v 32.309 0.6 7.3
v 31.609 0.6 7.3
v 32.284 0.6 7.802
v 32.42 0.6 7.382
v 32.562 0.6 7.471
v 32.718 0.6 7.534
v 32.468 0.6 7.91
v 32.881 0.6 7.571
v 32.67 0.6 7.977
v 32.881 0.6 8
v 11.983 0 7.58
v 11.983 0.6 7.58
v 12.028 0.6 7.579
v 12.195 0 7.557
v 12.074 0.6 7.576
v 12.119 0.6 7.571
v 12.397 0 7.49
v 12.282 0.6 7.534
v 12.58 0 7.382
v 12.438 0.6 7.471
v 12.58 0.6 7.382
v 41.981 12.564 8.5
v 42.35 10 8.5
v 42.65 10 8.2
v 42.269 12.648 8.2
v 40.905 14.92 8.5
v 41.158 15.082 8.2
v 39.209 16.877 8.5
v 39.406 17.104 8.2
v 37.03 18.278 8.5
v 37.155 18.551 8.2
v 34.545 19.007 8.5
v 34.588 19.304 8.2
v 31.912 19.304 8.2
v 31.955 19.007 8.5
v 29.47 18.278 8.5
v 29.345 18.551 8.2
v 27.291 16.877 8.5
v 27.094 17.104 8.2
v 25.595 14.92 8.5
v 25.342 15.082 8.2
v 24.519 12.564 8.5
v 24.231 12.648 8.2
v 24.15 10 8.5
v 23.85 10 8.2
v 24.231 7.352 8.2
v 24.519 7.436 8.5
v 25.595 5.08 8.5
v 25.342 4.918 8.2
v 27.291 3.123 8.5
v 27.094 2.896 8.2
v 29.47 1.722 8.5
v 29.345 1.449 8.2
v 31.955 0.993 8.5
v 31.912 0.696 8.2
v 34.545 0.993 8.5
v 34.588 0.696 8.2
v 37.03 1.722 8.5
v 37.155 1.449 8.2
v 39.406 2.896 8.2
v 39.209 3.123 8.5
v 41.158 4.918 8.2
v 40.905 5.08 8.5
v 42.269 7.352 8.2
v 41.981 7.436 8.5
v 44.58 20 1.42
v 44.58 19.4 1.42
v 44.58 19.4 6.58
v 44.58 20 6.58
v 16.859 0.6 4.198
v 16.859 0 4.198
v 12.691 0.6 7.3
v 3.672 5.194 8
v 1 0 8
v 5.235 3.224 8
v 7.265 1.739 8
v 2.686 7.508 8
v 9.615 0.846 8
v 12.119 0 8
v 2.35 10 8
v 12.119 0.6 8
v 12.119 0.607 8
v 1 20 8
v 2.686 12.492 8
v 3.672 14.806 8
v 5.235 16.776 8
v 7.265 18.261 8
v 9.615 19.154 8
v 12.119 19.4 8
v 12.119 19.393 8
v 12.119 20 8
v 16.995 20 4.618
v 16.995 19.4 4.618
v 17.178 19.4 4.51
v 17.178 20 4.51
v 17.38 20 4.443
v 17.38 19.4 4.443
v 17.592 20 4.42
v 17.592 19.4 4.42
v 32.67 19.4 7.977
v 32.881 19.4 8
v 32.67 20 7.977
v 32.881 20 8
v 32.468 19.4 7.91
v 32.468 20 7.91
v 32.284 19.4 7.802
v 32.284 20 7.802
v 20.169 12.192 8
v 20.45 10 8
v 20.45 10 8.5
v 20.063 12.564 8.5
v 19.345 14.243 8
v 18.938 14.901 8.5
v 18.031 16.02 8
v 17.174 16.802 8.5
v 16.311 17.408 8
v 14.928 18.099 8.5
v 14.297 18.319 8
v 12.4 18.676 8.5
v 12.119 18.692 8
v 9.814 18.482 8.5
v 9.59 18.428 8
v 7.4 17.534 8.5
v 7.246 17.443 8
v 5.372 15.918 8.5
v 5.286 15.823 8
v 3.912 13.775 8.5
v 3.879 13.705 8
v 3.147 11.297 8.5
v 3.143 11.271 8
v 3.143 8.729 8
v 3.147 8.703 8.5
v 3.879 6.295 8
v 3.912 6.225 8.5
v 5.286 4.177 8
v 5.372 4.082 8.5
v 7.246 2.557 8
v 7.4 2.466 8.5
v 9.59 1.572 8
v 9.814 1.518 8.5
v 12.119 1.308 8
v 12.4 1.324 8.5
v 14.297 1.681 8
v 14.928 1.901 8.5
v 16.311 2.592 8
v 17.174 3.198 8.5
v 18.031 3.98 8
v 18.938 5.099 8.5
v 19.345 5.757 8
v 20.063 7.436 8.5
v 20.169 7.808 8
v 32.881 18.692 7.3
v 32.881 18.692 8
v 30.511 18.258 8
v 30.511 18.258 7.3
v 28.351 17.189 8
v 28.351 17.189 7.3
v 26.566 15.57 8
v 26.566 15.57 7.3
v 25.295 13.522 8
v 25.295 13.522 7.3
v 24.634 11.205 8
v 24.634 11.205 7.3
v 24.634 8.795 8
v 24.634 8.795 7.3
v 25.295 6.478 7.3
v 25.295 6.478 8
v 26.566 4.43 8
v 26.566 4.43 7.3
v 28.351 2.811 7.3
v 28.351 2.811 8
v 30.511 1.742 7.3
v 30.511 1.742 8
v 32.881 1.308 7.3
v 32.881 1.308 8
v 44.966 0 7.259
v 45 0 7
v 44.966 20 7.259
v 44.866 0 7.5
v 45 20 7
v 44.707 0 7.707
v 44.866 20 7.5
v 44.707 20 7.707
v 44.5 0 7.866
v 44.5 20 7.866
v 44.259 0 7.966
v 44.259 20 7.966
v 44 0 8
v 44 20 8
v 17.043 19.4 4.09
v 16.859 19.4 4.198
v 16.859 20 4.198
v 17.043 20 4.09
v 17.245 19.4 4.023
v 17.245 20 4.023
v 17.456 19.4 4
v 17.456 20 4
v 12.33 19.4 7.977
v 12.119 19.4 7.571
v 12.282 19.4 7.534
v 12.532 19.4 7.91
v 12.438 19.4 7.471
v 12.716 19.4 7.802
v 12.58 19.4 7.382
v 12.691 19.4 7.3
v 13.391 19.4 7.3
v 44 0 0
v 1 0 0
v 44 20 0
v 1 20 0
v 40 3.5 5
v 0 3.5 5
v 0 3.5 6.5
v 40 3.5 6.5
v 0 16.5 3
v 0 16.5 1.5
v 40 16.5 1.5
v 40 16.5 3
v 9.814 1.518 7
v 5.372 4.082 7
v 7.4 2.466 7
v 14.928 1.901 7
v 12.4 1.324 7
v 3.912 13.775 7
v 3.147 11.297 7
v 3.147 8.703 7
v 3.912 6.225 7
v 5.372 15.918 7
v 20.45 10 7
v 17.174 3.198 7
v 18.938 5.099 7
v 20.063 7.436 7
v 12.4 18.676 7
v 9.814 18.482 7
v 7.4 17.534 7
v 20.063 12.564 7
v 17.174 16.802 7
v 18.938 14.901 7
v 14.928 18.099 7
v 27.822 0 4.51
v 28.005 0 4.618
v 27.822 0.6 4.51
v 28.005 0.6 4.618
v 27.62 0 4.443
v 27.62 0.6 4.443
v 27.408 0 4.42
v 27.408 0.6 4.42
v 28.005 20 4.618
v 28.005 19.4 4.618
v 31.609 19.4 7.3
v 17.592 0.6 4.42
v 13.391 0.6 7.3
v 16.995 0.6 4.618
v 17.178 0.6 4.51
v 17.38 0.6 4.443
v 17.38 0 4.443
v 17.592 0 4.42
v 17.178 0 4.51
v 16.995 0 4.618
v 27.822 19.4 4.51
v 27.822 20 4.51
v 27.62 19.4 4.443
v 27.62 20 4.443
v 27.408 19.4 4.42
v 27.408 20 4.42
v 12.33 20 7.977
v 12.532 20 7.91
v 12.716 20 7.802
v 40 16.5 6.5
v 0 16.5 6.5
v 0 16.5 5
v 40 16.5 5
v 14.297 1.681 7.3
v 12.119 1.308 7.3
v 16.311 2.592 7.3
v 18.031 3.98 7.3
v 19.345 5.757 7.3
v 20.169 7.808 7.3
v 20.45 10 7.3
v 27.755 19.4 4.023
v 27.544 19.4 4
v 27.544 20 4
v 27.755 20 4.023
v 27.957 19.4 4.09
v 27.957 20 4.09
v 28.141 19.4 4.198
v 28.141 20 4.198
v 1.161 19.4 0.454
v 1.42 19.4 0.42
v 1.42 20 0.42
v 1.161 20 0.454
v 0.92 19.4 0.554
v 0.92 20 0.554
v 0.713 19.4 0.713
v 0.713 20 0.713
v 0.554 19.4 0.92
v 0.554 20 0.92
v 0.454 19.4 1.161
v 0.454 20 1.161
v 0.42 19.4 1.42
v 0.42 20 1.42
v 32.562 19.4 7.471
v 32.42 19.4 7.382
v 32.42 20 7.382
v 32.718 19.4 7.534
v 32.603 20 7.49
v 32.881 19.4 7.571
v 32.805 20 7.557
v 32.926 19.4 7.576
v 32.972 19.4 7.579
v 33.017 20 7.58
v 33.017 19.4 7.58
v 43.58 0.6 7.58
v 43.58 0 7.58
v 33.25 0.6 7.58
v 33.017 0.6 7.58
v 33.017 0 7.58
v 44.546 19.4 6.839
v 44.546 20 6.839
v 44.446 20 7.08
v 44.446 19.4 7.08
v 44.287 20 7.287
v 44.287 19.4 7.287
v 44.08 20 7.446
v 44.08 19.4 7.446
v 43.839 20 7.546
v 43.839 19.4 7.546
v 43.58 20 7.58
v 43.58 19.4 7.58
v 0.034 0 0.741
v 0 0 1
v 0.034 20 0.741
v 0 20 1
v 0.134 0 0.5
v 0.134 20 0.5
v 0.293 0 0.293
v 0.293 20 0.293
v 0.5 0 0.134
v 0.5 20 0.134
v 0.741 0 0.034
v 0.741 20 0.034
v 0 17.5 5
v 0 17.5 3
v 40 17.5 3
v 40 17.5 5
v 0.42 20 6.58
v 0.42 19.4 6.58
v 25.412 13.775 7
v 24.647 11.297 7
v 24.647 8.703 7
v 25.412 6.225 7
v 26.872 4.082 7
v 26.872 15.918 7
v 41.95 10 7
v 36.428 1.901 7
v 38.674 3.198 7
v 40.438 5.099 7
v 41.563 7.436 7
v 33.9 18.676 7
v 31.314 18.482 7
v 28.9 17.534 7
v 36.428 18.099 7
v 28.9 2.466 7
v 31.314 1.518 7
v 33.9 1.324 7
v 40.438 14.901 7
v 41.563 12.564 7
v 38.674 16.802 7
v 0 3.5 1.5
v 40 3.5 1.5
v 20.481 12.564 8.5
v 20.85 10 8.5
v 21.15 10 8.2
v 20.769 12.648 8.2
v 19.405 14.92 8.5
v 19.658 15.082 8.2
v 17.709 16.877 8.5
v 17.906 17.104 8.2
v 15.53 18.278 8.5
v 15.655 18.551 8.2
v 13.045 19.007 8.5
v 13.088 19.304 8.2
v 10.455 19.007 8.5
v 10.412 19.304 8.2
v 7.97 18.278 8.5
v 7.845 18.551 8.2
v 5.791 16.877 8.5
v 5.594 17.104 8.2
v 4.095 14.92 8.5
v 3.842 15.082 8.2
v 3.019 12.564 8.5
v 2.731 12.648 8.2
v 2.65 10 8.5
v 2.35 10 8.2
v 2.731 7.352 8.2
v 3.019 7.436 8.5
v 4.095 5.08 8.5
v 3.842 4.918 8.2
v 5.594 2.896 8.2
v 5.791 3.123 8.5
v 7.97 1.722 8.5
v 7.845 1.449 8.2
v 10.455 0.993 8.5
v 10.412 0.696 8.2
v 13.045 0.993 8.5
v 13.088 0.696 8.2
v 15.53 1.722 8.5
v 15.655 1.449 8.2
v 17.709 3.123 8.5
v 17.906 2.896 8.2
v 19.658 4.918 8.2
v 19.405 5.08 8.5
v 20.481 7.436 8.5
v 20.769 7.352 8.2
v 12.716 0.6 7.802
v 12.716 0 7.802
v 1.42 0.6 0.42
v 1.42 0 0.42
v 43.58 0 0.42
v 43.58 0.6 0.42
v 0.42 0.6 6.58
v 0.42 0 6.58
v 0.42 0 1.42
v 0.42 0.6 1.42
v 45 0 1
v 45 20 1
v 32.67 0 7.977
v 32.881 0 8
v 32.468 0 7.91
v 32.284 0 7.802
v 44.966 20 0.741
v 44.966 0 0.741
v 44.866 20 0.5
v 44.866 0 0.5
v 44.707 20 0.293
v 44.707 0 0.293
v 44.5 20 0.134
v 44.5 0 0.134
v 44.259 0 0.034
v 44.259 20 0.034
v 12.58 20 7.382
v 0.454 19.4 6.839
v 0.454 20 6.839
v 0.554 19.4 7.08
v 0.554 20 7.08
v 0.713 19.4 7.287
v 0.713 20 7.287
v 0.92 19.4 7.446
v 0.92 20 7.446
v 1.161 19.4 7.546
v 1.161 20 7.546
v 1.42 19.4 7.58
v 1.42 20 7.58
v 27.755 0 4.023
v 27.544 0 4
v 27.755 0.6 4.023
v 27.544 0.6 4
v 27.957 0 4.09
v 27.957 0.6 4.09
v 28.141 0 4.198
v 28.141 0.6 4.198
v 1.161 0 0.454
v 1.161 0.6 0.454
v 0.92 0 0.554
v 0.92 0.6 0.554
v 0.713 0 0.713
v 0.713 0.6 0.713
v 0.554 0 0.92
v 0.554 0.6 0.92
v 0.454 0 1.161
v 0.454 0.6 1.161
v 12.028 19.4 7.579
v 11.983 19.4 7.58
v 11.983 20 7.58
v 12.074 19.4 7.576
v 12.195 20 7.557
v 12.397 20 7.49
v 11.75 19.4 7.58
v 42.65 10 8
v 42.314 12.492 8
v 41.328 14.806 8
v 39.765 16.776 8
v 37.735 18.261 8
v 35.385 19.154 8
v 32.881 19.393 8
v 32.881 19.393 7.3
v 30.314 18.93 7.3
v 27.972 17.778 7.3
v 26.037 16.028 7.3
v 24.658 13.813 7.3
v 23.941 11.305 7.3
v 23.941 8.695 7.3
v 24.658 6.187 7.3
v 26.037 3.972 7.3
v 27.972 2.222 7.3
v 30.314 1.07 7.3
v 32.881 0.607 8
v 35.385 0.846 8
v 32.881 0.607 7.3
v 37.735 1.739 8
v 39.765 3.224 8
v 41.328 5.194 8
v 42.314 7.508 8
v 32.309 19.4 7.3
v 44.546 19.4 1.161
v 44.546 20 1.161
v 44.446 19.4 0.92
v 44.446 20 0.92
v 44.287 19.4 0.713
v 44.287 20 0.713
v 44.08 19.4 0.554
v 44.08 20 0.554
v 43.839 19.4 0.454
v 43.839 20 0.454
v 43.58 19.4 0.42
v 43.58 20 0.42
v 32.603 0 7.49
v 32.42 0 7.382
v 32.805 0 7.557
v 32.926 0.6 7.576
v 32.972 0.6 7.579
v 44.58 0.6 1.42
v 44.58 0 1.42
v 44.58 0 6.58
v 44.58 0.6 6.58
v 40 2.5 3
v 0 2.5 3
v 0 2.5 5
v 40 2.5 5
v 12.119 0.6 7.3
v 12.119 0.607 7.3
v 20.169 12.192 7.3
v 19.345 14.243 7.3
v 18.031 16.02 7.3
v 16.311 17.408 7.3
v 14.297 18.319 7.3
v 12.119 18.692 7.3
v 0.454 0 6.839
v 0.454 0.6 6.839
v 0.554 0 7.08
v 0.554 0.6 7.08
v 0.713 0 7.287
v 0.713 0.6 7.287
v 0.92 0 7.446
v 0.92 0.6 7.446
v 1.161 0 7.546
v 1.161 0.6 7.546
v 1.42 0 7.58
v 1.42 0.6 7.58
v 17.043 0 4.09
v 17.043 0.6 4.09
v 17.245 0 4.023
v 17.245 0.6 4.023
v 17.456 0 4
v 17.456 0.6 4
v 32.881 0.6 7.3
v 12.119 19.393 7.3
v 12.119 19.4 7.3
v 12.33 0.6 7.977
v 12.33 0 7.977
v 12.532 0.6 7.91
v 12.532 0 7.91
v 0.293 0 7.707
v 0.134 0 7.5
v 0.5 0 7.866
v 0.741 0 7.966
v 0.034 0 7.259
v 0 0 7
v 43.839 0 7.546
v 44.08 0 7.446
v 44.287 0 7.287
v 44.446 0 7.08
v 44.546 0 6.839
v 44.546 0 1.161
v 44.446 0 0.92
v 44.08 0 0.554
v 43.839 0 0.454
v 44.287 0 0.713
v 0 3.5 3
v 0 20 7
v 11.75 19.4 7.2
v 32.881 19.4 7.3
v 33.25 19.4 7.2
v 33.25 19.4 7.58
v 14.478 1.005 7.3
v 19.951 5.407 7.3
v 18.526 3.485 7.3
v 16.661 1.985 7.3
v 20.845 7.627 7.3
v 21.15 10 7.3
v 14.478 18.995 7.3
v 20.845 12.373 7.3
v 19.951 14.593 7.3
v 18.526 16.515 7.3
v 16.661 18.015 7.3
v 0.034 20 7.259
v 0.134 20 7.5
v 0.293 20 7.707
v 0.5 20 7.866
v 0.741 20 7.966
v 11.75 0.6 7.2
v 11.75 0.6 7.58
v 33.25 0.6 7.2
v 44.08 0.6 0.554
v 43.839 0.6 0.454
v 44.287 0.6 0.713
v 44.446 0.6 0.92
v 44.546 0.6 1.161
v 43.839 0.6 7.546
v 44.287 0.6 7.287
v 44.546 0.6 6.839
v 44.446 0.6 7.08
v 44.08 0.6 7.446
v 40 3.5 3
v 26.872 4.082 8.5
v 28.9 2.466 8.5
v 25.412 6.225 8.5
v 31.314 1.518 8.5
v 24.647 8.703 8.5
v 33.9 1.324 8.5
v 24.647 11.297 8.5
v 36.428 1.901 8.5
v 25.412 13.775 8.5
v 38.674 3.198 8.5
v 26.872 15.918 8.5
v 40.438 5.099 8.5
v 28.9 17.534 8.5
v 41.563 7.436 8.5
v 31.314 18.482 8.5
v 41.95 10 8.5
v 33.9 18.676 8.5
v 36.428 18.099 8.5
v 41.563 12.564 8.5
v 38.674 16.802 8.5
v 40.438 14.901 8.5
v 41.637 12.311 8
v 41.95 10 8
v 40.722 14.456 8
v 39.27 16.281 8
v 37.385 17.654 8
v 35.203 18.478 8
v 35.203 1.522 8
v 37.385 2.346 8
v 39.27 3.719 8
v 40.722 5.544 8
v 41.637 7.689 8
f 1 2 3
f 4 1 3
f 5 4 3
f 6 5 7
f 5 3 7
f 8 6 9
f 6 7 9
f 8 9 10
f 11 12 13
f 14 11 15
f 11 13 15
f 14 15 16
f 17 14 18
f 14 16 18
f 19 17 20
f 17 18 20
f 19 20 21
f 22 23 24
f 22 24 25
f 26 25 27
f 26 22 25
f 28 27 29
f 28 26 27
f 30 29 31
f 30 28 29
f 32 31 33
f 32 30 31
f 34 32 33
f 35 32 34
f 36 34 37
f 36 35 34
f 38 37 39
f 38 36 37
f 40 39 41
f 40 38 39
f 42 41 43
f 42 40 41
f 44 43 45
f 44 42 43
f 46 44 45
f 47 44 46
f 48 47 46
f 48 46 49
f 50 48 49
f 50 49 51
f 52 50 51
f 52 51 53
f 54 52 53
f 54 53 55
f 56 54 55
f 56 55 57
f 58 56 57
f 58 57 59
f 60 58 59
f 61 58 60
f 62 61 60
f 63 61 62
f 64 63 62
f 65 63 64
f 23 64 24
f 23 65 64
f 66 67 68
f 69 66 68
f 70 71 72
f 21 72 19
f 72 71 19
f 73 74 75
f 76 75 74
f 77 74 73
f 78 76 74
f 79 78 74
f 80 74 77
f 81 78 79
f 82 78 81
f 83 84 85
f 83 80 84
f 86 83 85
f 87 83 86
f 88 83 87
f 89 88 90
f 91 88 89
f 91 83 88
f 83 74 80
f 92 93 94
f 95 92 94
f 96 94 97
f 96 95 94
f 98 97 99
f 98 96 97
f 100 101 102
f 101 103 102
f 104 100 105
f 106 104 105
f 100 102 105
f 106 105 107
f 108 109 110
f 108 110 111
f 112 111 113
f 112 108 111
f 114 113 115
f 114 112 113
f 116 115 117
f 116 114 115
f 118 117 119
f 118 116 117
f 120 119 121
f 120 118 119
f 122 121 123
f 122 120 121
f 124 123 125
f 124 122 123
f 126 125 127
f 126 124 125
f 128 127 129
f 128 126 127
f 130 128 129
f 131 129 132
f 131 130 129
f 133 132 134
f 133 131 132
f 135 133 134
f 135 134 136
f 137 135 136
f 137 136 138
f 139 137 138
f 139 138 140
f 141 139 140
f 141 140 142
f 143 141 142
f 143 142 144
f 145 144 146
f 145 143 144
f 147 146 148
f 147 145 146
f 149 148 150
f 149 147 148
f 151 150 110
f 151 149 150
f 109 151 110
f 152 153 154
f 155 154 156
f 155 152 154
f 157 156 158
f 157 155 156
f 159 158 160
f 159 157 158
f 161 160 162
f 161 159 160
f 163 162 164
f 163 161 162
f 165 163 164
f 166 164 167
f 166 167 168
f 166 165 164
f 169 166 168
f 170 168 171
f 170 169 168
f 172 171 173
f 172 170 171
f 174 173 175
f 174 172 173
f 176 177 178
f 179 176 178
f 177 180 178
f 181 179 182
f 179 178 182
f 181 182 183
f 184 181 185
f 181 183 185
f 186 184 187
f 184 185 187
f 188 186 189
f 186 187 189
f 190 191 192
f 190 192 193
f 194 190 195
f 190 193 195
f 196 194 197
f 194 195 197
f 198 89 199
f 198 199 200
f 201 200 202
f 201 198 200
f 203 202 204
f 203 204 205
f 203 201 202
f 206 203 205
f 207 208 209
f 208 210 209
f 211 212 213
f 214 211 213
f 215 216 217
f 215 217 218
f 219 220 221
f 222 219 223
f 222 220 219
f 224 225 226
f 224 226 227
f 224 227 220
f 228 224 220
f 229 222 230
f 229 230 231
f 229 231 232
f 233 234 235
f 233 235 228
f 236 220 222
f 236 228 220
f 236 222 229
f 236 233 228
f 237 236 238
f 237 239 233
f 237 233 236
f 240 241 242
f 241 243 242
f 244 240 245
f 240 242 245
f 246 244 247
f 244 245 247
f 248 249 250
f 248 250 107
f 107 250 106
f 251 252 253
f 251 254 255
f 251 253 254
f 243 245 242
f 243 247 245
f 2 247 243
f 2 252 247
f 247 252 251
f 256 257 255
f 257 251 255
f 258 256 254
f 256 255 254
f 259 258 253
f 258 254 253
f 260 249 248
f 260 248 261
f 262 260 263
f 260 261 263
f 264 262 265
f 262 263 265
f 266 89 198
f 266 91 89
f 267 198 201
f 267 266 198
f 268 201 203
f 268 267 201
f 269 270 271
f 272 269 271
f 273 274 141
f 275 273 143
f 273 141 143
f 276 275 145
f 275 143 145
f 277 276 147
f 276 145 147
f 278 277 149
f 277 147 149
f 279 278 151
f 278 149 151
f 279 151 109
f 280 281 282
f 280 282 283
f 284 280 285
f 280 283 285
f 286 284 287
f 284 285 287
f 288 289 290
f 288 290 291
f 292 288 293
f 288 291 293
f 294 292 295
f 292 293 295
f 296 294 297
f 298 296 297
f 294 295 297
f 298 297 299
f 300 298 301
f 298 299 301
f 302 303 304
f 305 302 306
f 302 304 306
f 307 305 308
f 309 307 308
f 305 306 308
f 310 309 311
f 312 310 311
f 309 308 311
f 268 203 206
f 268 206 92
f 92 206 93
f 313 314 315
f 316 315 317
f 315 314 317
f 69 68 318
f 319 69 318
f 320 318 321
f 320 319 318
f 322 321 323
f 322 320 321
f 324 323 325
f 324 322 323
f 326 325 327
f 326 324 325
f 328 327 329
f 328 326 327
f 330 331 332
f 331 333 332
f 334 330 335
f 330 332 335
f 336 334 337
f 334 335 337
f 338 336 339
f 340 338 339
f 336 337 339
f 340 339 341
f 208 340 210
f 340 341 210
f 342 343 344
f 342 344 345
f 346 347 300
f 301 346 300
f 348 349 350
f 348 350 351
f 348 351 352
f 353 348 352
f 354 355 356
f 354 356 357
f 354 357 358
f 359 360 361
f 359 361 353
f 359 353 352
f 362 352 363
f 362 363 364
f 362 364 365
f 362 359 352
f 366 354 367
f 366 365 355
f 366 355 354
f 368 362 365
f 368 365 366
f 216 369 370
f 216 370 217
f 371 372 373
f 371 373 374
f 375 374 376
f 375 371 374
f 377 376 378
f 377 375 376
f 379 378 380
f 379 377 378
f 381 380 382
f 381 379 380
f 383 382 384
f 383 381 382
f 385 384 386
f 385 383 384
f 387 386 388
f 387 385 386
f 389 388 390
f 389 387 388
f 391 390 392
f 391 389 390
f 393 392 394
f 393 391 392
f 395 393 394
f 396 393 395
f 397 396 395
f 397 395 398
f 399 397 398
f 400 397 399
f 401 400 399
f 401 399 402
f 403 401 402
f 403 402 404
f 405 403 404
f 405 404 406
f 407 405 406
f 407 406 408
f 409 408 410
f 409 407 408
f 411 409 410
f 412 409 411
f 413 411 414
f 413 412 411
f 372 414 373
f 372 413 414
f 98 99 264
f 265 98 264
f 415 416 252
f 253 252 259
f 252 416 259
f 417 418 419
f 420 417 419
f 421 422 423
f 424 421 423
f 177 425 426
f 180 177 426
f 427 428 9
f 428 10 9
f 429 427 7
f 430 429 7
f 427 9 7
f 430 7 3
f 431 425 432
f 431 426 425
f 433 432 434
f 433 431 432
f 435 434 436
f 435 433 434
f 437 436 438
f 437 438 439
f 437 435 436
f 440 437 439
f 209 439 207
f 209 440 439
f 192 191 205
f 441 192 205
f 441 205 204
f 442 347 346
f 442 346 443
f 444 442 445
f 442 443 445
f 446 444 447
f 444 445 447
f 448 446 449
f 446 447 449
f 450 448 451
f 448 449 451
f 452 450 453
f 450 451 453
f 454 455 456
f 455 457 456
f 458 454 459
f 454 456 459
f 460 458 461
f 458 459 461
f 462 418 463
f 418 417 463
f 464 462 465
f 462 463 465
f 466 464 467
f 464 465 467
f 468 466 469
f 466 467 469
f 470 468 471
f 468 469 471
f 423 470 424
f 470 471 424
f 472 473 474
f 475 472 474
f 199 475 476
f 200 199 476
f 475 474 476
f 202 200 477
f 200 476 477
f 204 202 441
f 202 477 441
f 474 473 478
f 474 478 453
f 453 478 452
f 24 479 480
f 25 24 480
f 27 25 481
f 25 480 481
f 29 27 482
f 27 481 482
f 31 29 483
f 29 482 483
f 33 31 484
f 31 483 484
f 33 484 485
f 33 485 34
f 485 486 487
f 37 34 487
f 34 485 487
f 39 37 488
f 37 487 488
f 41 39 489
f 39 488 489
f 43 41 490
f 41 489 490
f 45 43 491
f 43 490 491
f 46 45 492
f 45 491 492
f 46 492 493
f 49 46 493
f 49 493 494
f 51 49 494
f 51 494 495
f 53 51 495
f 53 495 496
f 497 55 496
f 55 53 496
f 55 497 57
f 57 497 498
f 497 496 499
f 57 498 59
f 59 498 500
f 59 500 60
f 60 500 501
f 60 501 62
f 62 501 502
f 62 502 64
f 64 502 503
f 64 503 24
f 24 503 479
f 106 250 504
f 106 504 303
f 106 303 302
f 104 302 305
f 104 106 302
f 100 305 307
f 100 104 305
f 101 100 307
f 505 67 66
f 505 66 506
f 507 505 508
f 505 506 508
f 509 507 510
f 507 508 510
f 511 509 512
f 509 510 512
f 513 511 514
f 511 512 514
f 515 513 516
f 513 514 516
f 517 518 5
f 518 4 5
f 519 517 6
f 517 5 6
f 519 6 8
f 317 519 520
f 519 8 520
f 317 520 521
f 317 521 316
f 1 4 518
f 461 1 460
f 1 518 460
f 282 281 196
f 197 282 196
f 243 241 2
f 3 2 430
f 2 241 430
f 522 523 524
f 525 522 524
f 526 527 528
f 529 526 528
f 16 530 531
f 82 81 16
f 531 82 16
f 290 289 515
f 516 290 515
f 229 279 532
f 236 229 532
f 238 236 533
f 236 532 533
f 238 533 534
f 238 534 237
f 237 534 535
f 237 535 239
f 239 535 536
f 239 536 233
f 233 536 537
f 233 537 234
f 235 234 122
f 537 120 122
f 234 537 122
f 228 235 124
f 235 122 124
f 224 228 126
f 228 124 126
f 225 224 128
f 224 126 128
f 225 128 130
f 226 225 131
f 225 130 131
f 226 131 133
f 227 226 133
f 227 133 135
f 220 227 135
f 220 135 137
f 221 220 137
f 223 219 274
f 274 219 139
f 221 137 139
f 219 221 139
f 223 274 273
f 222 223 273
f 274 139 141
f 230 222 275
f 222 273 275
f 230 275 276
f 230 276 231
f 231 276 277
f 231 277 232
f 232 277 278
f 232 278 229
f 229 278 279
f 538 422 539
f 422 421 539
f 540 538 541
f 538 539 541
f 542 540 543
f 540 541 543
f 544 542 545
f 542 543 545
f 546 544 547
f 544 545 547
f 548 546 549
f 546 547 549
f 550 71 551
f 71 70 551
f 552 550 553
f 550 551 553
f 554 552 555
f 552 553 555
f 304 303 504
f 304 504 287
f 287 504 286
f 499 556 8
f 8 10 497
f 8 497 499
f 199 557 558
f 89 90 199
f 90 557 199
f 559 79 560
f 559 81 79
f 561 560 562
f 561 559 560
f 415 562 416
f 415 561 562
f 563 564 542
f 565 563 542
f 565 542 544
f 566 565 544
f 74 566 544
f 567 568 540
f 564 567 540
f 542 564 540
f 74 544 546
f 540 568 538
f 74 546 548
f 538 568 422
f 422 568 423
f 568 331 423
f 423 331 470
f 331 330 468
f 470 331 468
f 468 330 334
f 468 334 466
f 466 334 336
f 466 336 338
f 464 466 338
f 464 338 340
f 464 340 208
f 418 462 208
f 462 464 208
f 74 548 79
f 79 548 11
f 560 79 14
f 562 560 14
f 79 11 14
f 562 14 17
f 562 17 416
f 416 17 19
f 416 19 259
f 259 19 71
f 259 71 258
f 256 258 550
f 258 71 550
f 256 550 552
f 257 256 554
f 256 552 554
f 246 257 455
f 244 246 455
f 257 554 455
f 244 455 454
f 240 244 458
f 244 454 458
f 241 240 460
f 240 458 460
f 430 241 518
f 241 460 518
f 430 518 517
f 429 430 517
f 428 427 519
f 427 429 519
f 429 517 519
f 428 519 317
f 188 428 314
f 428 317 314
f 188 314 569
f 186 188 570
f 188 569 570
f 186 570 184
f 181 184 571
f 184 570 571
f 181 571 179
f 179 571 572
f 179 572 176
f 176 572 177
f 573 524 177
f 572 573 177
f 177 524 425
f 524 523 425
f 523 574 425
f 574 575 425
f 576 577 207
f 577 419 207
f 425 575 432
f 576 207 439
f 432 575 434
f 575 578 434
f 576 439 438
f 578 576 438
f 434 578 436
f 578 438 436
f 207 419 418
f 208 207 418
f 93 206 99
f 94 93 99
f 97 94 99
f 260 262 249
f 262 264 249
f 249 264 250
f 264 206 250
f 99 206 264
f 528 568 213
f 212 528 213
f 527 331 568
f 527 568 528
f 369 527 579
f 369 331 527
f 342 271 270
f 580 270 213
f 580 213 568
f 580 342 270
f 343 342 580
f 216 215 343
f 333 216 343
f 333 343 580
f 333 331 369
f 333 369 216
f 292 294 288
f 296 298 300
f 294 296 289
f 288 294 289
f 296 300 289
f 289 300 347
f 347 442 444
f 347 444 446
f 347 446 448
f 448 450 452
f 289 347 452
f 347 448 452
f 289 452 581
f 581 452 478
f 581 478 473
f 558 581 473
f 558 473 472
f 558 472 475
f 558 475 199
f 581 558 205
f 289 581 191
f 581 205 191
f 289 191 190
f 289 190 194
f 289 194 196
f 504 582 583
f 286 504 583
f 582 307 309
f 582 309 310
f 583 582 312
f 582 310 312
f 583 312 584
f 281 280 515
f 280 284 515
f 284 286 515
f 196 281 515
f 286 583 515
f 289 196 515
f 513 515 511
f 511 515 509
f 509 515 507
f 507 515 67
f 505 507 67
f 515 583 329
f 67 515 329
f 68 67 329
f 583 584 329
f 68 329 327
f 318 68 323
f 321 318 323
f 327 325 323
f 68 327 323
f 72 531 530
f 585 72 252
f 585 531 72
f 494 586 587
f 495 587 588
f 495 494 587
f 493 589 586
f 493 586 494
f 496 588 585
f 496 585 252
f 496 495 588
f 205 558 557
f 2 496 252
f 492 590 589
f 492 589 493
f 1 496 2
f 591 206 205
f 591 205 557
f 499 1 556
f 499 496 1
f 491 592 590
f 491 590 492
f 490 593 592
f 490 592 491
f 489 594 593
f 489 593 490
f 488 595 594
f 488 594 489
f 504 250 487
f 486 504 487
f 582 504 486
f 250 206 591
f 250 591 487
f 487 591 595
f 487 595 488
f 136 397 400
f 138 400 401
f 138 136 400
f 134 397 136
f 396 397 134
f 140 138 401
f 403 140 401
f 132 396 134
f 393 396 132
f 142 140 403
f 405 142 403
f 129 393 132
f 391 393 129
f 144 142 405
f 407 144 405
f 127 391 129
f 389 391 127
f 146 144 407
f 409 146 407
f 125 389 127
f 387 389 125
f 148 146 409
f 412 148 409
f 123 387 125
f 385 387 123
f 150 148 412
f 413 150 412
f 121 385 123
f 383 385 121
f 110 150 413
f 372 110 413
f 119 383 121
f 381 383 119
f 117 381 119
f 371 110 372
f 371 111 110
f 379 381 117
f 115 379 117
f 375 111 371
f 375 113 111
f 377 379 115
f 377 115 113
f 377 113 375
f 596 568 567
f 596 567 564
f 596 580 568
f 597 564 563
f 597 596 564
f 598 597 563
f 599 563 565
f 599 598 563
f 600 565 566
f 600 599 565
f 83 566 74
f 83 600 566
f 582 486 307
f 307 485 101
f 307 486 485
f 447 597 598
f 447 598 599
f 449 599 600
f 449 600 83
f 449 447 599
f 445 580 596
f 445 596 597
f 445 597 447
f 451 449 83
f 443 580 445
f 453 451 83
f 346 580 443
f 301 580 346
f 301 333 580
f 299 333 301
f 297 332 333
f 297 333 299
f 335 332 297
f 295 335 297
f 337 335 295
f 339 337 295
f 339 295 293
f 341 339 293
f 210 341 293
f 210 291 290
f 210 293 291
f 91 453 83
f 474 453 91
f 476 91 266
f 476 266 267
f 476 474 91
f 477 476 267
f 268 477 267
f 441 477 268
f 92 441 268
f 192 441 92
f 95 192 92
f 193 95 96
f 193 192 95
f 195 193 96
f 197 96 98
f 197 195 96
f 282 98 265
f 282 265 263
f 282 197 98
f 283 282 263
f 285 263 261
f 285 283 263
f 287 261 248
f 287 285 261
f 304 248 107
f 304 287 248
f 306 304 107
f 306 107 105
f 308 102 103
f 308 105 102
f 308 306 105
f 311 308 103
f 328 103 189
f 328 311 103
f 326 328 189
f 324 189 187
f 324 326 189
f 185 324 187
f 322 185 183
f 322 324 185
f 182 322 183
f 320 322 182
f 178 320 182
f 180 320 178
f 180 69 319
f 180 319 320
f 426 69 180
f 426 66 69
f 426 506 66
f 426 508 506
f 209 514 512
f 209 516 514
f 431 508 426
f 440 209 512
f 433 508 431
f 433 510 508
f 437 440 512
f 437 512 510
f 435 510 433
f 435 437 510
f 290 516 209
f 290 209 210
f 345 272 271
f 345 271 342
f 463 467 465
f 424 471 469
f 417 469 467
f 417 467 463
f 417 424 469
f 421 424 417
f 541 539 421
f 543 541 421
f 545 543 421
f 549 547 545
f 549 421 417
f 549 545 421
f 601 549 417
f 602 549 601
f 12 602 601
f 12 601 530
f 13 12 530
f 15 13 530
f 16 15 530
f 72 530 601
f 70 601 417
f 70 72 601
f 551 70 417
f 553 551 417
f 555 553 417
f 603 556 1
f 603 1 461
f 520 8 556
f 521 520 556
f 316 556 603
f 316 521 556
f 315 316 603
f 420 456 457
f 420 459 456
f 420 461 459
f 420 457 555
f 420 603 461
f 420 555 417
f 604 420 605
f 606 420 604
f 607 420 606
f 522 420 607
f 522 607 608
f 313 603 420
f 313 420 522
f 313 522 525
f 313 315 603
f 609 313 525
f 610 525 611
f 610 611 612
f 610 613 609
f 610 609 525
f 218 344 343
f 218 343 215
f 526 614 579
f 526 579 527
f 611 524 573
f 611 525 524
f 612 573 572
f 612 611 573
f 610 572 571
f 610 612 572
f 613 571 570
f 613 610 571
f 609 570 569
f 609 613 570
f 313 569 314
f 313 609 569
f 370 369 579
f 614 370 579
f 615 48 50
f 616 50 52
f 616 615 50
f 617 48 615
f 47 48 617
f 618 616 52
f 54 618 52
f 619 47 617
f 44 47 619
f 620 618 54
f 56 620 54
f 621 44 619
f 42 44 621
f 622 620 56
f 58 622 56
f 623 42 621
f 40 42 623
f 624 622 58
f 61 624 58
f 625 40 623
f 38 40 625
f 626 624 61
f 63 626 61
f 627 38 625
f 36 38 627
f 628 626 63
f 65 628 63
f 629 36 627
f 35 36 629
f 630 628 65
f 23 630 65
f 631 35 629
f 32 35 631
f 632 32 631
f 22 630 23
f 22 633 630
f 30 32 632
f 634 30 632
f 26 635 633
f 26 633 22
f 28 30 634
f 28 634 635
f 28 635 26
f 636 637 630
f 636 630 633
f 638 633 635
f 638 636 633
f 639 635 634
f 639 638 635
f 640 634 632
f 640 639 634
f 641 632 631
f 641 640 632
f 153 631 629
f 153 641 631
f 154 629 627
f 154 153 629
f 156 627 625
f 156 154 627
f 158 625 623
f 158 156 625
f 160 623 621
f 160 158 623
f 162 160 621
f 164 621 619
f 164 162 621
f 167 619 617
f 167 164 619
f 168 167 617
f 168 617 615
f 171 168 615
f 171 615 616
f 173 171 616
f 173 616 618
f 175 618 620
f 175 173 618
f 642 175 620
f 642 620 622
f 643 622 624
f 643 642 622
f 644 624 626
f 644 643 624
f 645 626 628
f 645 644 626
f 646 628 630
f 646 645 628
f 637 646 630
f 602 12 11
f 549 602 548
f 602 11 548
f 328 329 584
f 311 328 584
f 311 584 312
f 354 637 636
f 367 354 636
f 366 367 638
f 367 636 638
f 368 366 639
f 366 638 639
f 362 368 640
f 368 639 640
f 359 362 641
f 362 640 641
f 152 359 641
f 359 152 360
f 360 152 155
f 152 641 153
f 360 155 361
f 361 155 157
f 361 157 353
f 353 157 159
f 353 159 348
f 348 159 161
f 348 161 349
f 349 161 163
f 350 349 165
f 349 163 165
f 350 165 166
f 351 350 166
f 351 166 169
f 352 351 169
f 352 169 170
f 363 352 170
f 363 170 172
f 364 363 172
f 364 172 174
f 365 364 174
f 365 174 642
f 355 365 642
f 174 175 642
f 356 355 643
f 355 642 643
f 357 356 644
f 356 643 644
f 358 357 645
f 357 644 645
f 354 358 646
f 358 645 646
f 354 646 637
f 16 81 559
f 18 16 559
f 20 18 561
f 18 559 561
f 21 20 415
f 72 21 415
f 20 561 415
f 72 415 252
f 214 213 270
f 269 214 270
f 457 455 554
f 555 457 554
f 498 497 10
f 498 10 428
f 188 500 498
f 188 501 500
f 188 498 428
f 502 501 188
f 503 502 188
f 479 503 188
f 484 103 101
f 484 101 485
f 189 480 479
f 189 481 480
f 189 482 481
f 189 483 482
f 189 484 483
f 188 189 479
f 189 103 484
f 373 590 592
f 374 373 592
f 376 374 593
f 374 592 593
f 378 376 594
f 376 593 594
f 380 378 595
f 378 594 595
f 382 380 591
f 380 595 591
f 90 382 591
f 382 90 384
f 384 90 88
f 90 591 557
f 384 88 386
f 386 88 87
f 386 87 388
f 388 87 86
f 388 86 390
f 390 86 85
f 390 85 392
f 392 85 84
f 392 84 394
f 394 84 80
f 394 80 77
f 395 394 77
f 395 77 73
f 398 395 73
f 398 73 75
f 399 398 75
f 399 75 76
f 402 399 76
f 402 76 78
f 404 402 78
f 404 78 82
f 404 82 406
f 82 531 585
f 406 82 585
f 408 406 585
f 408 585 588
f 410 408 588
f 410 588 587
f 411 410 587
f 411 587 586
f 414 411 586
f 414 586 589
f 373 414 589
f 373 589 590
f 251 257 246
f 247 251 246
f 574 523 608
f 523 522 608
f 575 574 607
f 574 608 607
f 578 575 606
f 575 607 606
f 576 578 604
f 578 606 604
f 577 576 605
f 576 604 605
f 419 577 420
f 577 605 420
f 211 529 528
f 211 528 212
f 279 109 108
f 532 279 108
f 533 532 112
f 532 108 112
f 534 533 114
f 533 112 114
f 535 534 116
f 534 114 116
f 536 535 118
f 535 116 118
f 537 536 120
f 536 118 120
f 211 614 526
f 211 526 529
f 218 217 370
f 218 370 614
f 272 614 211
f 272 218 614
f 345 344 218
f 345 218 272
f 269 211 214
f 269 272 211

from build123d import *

# Parameters (mm, degrees)
SKETCH1_W              = 45
SKETCH1_H              = 20
BOSS_EXTRUDE1_DEPTH    = 8
FILLET1_R              = 1
SKETCH3_R              = 9.4
SKETCH3_R_2            = 8.7
BOSS_EXTRUDE2_DEPTH    = 0.5
CUT_EXTRUDE1_DEPTH     = 0.6
FILLET2_R              = 1
LPATTERN3_COUNT        = 2
LPATTERN3_PITCH        = 19.4
FILLET2_OF_LPATTERN3_R = 1
SKETCH6_W              = 20.76252332
SKETCH6_H              = 18.8
CUT_EXTRUDE3_DEPTH     = 0.7
SKETCH7_R              = 9.4
SKETCH7_R_2            = 8.7
BOSS_EXTRUDE4_DEPTH    = 1.3
SKETCH8_R              = 9.4
SKETCH8_R_2            = 8.7
BOSS_EXTRUDE5_DEPTH    = 1.3
CHAMFER1_SIZE          = 0.3
SKETCH12_R             = 8.7
CUT_EXTRUDE4_DEPTH     = 1
SKETCH13_R             = 8.7
CUT_EXTRUDE5_DEPTH     = 1
SKETCH19_W             = 1.5
SKETCH19_H             = 13
SKETCH19_W_2           = 2
SKETCH19_H_2           = 1
CUT_EXTRUDE6_DEPTH     = 40


with BuildPart() as part:
    # Sketch1 → Boss-Extrude1 (new body)
    with BuildSketch(Plane.XY):
        with Locations((22.5, 10)):
            Rectangle(SKETCH1_W, SKETCH1_H)
    extrude(amount=BOSS_EXTRUDE1_DEPTH)

    # Fillet1
    fillet1_edges = [part.edges().sort_by_distance(p)[0] for p in [
        (45, 10, 8),
        (0, 10, 8),
        (45, 10, 0),
        (0, 10, 0),
    ]]
    fillet(fillet1_edges, radius=FILLET1_R)

    # Sketch3 → Boss-Extrude2 (add)
    with BuildSketch(Plane.XY.offset(8)):
        with Locations((11.75, 10)):
            Circle(SKETCH3_R)
        with Locations((11.75, 10)):
            Circle(SKETCH3_R_2, mode=Mode.SUBTRACT)
        with Locations((33.25, 10)):
            Circle(SKETCH3_R)
        with Locations((33.25, 10)):
            Circle(SKETCH3_R_2, mode=Mode.SUBTRACT)
    extrude(amount=BOSS_EXTRUDE2_DEPTH)

    # Sketch4 → Cut-Extrude1 (cut)
    with BuildSketch(Plane.XZ):
        Polygon((27.739375, 4.42), (32.55, 8), (12.45, 8), (17.260625, 4.42), align=None)
        Polygon((44.58, 7.58), (32.685625, 7.58), (27.875, 4), (27.175, 4), (17.825, 4), (17.125, 4), (12.314375, 7.58), (0.42, 7.58), (0.42, 0.42), (44.58, 0.42), align=None)
    cut_extrude1 = extrude(amount=-CUT_EXTRUDE1_DEPTH, mode=Mode.SUBTRACT)

    # Fillet2
    fillet2_edges = [part.edges().sort_by_distance(p)[0] for p in [
        (0.42, 0.3, 7.58),
        (12.314375, 0.3, 7.58),
        (17.125, 0.3, 4),
        (27.875, 0.3, 4),
        (32.685625, 0.3, 7.58),
        (44.58, 0.3, 7.58),
        (44.58, 0.3, 0.42),
        (0.42, 0.3, 0.42),
        (17.260625, 0.3, 4.42),
        (12.45, 0.3, 8),
        (32.55, 0.3, 8),
        (27.739375, 0.3, 4.42),
    ]]
    fillet(fillet2_edges, radius=FILLET2_R)

    # LPattern3: Cut-Extrude1 ×2
    with Locations(*[(0, i * LPATTERN3_PITCH, 0) for i in range(1, LPATTERN3_COUNT)]):
        add(cut_extrude1, mode=Mode.SUBTRACT)

    # Fillet2 of LPattern3
    fillet2_of_lpattern3_edges = [part.edges().sort_by_distance(p)[0] for p in [
        (0.42, 19.7, 7.58),
        (12.314375, 19.7, 7.58),
        (17.125, 19.7, 4),
        (27.875, 19.7, 4),
        (32.685625, 19.7, 7.58),
        (44.58, 19.7, 7.58),
        (44.58, 19.7, 0.42),
        (0.42, 19.7, 0.42),
        (17.260625, 19.7, 4.42),
        (12.45, 19.7, 8),
        (32.55, 19.7, 8),
        (27.739375, 19.7, 4.42),
    ]]
    fillet(fillet2_of_lpattern3_edges, radius=FILLET2_OF_LPATTERN3_R)

    # Sketch6 → Cut-Extrude3 (cut)
    with BuildSketch(Plane.XY.offset(8)):
        with Locations((22.5, 10)):
            Rectangle(SKETCH6_W, SKETCH6_H)
    extrude(amount=-CUT_EXTRUDE3_DEPTH, mode=Mode.SUBTRACT)

    # Sketch7 → Boss-Extrude4 (add)
    with BuildSketch(Plane.XY.offset(8.5)):
        with Locations((11.75, 10)):
            Circle(SKETCH7_R)
        with Locations((11.75, 10)):
            Circle(SKETCH7_R_2, mode=Mode.SUBTRACT)
    extrude(amount=-BOSS_EXTRUDE4_DEPTH)

    # Sketch8 → Boss-Extrude5 (add)
    with BuildSketch(Plane.XY.offset(8.5)):
        with Locations((33.25, 10)):
            Circle(SKETCH8_R)
        with Locations((33.25, 10)):
            Circle(SKETCH8_R_2, mode=Mode.SUBTRACT)
    extrude(amount=-BOSS_EXTRUDE5_DEPTH)

    # Chamfer1
    chamfer1_edges = [part.edges().sort_by_distance(p)[0] for p in [
        (2.35, 10, 8.5),
        (23.85, 10, 8.5),
    ]]
    chamfer(chamfer1_edges, length=CHAMFER1_SIZE)

    # Sketch12 → Cut-Extrude4 (cut)
    with BuildSketch(Plane.XY.offset(8)):
        with Locations((33.25, 10)):
            Circle(SKETCH12_R)
    extrude(amount=-CUT_EXTRUDE4_DEPTH, mode=Mode.SUBTRACT)

    # Sketch13 → Cut-Extrude5 (cut)
    with BuildSketch(Plane.XY.offset(8)):
        with Locations((11.75, 10)):
            Circle(SKETCH13_R)
    extrude(amount=-CUT_EXTRUDE5_DEPTH, mode=Mode.SUBTRACT)

    # Sketch19 → Cut-Extrude6 (cut)
    with BuildSketch(Plane.ZY):
        with Locations((5.75, 10)):
            Rectangle(SKETCH19_W, SKETCH19_H)
        with Locations((4, 10)):
            Rectangle(SKETCH19_W_2, SKETCH19_H)
        with Locations((4, 17)):
            Rectangle(SKETCH19_W_2, SKETCH19_H_2)
        with Locations((4, 3)):
            Rectangle(SKETCH19_W_2, SKETCH19_H_2)
        with Locations((2.25, 10)):
            Rectangle(SKETCH19_W, SKETCH19_H)
    extrude(amount=-CUT_EXTRUDE6_DEPTH, mode=Mode.SUBTRACT)


solid = part.part
